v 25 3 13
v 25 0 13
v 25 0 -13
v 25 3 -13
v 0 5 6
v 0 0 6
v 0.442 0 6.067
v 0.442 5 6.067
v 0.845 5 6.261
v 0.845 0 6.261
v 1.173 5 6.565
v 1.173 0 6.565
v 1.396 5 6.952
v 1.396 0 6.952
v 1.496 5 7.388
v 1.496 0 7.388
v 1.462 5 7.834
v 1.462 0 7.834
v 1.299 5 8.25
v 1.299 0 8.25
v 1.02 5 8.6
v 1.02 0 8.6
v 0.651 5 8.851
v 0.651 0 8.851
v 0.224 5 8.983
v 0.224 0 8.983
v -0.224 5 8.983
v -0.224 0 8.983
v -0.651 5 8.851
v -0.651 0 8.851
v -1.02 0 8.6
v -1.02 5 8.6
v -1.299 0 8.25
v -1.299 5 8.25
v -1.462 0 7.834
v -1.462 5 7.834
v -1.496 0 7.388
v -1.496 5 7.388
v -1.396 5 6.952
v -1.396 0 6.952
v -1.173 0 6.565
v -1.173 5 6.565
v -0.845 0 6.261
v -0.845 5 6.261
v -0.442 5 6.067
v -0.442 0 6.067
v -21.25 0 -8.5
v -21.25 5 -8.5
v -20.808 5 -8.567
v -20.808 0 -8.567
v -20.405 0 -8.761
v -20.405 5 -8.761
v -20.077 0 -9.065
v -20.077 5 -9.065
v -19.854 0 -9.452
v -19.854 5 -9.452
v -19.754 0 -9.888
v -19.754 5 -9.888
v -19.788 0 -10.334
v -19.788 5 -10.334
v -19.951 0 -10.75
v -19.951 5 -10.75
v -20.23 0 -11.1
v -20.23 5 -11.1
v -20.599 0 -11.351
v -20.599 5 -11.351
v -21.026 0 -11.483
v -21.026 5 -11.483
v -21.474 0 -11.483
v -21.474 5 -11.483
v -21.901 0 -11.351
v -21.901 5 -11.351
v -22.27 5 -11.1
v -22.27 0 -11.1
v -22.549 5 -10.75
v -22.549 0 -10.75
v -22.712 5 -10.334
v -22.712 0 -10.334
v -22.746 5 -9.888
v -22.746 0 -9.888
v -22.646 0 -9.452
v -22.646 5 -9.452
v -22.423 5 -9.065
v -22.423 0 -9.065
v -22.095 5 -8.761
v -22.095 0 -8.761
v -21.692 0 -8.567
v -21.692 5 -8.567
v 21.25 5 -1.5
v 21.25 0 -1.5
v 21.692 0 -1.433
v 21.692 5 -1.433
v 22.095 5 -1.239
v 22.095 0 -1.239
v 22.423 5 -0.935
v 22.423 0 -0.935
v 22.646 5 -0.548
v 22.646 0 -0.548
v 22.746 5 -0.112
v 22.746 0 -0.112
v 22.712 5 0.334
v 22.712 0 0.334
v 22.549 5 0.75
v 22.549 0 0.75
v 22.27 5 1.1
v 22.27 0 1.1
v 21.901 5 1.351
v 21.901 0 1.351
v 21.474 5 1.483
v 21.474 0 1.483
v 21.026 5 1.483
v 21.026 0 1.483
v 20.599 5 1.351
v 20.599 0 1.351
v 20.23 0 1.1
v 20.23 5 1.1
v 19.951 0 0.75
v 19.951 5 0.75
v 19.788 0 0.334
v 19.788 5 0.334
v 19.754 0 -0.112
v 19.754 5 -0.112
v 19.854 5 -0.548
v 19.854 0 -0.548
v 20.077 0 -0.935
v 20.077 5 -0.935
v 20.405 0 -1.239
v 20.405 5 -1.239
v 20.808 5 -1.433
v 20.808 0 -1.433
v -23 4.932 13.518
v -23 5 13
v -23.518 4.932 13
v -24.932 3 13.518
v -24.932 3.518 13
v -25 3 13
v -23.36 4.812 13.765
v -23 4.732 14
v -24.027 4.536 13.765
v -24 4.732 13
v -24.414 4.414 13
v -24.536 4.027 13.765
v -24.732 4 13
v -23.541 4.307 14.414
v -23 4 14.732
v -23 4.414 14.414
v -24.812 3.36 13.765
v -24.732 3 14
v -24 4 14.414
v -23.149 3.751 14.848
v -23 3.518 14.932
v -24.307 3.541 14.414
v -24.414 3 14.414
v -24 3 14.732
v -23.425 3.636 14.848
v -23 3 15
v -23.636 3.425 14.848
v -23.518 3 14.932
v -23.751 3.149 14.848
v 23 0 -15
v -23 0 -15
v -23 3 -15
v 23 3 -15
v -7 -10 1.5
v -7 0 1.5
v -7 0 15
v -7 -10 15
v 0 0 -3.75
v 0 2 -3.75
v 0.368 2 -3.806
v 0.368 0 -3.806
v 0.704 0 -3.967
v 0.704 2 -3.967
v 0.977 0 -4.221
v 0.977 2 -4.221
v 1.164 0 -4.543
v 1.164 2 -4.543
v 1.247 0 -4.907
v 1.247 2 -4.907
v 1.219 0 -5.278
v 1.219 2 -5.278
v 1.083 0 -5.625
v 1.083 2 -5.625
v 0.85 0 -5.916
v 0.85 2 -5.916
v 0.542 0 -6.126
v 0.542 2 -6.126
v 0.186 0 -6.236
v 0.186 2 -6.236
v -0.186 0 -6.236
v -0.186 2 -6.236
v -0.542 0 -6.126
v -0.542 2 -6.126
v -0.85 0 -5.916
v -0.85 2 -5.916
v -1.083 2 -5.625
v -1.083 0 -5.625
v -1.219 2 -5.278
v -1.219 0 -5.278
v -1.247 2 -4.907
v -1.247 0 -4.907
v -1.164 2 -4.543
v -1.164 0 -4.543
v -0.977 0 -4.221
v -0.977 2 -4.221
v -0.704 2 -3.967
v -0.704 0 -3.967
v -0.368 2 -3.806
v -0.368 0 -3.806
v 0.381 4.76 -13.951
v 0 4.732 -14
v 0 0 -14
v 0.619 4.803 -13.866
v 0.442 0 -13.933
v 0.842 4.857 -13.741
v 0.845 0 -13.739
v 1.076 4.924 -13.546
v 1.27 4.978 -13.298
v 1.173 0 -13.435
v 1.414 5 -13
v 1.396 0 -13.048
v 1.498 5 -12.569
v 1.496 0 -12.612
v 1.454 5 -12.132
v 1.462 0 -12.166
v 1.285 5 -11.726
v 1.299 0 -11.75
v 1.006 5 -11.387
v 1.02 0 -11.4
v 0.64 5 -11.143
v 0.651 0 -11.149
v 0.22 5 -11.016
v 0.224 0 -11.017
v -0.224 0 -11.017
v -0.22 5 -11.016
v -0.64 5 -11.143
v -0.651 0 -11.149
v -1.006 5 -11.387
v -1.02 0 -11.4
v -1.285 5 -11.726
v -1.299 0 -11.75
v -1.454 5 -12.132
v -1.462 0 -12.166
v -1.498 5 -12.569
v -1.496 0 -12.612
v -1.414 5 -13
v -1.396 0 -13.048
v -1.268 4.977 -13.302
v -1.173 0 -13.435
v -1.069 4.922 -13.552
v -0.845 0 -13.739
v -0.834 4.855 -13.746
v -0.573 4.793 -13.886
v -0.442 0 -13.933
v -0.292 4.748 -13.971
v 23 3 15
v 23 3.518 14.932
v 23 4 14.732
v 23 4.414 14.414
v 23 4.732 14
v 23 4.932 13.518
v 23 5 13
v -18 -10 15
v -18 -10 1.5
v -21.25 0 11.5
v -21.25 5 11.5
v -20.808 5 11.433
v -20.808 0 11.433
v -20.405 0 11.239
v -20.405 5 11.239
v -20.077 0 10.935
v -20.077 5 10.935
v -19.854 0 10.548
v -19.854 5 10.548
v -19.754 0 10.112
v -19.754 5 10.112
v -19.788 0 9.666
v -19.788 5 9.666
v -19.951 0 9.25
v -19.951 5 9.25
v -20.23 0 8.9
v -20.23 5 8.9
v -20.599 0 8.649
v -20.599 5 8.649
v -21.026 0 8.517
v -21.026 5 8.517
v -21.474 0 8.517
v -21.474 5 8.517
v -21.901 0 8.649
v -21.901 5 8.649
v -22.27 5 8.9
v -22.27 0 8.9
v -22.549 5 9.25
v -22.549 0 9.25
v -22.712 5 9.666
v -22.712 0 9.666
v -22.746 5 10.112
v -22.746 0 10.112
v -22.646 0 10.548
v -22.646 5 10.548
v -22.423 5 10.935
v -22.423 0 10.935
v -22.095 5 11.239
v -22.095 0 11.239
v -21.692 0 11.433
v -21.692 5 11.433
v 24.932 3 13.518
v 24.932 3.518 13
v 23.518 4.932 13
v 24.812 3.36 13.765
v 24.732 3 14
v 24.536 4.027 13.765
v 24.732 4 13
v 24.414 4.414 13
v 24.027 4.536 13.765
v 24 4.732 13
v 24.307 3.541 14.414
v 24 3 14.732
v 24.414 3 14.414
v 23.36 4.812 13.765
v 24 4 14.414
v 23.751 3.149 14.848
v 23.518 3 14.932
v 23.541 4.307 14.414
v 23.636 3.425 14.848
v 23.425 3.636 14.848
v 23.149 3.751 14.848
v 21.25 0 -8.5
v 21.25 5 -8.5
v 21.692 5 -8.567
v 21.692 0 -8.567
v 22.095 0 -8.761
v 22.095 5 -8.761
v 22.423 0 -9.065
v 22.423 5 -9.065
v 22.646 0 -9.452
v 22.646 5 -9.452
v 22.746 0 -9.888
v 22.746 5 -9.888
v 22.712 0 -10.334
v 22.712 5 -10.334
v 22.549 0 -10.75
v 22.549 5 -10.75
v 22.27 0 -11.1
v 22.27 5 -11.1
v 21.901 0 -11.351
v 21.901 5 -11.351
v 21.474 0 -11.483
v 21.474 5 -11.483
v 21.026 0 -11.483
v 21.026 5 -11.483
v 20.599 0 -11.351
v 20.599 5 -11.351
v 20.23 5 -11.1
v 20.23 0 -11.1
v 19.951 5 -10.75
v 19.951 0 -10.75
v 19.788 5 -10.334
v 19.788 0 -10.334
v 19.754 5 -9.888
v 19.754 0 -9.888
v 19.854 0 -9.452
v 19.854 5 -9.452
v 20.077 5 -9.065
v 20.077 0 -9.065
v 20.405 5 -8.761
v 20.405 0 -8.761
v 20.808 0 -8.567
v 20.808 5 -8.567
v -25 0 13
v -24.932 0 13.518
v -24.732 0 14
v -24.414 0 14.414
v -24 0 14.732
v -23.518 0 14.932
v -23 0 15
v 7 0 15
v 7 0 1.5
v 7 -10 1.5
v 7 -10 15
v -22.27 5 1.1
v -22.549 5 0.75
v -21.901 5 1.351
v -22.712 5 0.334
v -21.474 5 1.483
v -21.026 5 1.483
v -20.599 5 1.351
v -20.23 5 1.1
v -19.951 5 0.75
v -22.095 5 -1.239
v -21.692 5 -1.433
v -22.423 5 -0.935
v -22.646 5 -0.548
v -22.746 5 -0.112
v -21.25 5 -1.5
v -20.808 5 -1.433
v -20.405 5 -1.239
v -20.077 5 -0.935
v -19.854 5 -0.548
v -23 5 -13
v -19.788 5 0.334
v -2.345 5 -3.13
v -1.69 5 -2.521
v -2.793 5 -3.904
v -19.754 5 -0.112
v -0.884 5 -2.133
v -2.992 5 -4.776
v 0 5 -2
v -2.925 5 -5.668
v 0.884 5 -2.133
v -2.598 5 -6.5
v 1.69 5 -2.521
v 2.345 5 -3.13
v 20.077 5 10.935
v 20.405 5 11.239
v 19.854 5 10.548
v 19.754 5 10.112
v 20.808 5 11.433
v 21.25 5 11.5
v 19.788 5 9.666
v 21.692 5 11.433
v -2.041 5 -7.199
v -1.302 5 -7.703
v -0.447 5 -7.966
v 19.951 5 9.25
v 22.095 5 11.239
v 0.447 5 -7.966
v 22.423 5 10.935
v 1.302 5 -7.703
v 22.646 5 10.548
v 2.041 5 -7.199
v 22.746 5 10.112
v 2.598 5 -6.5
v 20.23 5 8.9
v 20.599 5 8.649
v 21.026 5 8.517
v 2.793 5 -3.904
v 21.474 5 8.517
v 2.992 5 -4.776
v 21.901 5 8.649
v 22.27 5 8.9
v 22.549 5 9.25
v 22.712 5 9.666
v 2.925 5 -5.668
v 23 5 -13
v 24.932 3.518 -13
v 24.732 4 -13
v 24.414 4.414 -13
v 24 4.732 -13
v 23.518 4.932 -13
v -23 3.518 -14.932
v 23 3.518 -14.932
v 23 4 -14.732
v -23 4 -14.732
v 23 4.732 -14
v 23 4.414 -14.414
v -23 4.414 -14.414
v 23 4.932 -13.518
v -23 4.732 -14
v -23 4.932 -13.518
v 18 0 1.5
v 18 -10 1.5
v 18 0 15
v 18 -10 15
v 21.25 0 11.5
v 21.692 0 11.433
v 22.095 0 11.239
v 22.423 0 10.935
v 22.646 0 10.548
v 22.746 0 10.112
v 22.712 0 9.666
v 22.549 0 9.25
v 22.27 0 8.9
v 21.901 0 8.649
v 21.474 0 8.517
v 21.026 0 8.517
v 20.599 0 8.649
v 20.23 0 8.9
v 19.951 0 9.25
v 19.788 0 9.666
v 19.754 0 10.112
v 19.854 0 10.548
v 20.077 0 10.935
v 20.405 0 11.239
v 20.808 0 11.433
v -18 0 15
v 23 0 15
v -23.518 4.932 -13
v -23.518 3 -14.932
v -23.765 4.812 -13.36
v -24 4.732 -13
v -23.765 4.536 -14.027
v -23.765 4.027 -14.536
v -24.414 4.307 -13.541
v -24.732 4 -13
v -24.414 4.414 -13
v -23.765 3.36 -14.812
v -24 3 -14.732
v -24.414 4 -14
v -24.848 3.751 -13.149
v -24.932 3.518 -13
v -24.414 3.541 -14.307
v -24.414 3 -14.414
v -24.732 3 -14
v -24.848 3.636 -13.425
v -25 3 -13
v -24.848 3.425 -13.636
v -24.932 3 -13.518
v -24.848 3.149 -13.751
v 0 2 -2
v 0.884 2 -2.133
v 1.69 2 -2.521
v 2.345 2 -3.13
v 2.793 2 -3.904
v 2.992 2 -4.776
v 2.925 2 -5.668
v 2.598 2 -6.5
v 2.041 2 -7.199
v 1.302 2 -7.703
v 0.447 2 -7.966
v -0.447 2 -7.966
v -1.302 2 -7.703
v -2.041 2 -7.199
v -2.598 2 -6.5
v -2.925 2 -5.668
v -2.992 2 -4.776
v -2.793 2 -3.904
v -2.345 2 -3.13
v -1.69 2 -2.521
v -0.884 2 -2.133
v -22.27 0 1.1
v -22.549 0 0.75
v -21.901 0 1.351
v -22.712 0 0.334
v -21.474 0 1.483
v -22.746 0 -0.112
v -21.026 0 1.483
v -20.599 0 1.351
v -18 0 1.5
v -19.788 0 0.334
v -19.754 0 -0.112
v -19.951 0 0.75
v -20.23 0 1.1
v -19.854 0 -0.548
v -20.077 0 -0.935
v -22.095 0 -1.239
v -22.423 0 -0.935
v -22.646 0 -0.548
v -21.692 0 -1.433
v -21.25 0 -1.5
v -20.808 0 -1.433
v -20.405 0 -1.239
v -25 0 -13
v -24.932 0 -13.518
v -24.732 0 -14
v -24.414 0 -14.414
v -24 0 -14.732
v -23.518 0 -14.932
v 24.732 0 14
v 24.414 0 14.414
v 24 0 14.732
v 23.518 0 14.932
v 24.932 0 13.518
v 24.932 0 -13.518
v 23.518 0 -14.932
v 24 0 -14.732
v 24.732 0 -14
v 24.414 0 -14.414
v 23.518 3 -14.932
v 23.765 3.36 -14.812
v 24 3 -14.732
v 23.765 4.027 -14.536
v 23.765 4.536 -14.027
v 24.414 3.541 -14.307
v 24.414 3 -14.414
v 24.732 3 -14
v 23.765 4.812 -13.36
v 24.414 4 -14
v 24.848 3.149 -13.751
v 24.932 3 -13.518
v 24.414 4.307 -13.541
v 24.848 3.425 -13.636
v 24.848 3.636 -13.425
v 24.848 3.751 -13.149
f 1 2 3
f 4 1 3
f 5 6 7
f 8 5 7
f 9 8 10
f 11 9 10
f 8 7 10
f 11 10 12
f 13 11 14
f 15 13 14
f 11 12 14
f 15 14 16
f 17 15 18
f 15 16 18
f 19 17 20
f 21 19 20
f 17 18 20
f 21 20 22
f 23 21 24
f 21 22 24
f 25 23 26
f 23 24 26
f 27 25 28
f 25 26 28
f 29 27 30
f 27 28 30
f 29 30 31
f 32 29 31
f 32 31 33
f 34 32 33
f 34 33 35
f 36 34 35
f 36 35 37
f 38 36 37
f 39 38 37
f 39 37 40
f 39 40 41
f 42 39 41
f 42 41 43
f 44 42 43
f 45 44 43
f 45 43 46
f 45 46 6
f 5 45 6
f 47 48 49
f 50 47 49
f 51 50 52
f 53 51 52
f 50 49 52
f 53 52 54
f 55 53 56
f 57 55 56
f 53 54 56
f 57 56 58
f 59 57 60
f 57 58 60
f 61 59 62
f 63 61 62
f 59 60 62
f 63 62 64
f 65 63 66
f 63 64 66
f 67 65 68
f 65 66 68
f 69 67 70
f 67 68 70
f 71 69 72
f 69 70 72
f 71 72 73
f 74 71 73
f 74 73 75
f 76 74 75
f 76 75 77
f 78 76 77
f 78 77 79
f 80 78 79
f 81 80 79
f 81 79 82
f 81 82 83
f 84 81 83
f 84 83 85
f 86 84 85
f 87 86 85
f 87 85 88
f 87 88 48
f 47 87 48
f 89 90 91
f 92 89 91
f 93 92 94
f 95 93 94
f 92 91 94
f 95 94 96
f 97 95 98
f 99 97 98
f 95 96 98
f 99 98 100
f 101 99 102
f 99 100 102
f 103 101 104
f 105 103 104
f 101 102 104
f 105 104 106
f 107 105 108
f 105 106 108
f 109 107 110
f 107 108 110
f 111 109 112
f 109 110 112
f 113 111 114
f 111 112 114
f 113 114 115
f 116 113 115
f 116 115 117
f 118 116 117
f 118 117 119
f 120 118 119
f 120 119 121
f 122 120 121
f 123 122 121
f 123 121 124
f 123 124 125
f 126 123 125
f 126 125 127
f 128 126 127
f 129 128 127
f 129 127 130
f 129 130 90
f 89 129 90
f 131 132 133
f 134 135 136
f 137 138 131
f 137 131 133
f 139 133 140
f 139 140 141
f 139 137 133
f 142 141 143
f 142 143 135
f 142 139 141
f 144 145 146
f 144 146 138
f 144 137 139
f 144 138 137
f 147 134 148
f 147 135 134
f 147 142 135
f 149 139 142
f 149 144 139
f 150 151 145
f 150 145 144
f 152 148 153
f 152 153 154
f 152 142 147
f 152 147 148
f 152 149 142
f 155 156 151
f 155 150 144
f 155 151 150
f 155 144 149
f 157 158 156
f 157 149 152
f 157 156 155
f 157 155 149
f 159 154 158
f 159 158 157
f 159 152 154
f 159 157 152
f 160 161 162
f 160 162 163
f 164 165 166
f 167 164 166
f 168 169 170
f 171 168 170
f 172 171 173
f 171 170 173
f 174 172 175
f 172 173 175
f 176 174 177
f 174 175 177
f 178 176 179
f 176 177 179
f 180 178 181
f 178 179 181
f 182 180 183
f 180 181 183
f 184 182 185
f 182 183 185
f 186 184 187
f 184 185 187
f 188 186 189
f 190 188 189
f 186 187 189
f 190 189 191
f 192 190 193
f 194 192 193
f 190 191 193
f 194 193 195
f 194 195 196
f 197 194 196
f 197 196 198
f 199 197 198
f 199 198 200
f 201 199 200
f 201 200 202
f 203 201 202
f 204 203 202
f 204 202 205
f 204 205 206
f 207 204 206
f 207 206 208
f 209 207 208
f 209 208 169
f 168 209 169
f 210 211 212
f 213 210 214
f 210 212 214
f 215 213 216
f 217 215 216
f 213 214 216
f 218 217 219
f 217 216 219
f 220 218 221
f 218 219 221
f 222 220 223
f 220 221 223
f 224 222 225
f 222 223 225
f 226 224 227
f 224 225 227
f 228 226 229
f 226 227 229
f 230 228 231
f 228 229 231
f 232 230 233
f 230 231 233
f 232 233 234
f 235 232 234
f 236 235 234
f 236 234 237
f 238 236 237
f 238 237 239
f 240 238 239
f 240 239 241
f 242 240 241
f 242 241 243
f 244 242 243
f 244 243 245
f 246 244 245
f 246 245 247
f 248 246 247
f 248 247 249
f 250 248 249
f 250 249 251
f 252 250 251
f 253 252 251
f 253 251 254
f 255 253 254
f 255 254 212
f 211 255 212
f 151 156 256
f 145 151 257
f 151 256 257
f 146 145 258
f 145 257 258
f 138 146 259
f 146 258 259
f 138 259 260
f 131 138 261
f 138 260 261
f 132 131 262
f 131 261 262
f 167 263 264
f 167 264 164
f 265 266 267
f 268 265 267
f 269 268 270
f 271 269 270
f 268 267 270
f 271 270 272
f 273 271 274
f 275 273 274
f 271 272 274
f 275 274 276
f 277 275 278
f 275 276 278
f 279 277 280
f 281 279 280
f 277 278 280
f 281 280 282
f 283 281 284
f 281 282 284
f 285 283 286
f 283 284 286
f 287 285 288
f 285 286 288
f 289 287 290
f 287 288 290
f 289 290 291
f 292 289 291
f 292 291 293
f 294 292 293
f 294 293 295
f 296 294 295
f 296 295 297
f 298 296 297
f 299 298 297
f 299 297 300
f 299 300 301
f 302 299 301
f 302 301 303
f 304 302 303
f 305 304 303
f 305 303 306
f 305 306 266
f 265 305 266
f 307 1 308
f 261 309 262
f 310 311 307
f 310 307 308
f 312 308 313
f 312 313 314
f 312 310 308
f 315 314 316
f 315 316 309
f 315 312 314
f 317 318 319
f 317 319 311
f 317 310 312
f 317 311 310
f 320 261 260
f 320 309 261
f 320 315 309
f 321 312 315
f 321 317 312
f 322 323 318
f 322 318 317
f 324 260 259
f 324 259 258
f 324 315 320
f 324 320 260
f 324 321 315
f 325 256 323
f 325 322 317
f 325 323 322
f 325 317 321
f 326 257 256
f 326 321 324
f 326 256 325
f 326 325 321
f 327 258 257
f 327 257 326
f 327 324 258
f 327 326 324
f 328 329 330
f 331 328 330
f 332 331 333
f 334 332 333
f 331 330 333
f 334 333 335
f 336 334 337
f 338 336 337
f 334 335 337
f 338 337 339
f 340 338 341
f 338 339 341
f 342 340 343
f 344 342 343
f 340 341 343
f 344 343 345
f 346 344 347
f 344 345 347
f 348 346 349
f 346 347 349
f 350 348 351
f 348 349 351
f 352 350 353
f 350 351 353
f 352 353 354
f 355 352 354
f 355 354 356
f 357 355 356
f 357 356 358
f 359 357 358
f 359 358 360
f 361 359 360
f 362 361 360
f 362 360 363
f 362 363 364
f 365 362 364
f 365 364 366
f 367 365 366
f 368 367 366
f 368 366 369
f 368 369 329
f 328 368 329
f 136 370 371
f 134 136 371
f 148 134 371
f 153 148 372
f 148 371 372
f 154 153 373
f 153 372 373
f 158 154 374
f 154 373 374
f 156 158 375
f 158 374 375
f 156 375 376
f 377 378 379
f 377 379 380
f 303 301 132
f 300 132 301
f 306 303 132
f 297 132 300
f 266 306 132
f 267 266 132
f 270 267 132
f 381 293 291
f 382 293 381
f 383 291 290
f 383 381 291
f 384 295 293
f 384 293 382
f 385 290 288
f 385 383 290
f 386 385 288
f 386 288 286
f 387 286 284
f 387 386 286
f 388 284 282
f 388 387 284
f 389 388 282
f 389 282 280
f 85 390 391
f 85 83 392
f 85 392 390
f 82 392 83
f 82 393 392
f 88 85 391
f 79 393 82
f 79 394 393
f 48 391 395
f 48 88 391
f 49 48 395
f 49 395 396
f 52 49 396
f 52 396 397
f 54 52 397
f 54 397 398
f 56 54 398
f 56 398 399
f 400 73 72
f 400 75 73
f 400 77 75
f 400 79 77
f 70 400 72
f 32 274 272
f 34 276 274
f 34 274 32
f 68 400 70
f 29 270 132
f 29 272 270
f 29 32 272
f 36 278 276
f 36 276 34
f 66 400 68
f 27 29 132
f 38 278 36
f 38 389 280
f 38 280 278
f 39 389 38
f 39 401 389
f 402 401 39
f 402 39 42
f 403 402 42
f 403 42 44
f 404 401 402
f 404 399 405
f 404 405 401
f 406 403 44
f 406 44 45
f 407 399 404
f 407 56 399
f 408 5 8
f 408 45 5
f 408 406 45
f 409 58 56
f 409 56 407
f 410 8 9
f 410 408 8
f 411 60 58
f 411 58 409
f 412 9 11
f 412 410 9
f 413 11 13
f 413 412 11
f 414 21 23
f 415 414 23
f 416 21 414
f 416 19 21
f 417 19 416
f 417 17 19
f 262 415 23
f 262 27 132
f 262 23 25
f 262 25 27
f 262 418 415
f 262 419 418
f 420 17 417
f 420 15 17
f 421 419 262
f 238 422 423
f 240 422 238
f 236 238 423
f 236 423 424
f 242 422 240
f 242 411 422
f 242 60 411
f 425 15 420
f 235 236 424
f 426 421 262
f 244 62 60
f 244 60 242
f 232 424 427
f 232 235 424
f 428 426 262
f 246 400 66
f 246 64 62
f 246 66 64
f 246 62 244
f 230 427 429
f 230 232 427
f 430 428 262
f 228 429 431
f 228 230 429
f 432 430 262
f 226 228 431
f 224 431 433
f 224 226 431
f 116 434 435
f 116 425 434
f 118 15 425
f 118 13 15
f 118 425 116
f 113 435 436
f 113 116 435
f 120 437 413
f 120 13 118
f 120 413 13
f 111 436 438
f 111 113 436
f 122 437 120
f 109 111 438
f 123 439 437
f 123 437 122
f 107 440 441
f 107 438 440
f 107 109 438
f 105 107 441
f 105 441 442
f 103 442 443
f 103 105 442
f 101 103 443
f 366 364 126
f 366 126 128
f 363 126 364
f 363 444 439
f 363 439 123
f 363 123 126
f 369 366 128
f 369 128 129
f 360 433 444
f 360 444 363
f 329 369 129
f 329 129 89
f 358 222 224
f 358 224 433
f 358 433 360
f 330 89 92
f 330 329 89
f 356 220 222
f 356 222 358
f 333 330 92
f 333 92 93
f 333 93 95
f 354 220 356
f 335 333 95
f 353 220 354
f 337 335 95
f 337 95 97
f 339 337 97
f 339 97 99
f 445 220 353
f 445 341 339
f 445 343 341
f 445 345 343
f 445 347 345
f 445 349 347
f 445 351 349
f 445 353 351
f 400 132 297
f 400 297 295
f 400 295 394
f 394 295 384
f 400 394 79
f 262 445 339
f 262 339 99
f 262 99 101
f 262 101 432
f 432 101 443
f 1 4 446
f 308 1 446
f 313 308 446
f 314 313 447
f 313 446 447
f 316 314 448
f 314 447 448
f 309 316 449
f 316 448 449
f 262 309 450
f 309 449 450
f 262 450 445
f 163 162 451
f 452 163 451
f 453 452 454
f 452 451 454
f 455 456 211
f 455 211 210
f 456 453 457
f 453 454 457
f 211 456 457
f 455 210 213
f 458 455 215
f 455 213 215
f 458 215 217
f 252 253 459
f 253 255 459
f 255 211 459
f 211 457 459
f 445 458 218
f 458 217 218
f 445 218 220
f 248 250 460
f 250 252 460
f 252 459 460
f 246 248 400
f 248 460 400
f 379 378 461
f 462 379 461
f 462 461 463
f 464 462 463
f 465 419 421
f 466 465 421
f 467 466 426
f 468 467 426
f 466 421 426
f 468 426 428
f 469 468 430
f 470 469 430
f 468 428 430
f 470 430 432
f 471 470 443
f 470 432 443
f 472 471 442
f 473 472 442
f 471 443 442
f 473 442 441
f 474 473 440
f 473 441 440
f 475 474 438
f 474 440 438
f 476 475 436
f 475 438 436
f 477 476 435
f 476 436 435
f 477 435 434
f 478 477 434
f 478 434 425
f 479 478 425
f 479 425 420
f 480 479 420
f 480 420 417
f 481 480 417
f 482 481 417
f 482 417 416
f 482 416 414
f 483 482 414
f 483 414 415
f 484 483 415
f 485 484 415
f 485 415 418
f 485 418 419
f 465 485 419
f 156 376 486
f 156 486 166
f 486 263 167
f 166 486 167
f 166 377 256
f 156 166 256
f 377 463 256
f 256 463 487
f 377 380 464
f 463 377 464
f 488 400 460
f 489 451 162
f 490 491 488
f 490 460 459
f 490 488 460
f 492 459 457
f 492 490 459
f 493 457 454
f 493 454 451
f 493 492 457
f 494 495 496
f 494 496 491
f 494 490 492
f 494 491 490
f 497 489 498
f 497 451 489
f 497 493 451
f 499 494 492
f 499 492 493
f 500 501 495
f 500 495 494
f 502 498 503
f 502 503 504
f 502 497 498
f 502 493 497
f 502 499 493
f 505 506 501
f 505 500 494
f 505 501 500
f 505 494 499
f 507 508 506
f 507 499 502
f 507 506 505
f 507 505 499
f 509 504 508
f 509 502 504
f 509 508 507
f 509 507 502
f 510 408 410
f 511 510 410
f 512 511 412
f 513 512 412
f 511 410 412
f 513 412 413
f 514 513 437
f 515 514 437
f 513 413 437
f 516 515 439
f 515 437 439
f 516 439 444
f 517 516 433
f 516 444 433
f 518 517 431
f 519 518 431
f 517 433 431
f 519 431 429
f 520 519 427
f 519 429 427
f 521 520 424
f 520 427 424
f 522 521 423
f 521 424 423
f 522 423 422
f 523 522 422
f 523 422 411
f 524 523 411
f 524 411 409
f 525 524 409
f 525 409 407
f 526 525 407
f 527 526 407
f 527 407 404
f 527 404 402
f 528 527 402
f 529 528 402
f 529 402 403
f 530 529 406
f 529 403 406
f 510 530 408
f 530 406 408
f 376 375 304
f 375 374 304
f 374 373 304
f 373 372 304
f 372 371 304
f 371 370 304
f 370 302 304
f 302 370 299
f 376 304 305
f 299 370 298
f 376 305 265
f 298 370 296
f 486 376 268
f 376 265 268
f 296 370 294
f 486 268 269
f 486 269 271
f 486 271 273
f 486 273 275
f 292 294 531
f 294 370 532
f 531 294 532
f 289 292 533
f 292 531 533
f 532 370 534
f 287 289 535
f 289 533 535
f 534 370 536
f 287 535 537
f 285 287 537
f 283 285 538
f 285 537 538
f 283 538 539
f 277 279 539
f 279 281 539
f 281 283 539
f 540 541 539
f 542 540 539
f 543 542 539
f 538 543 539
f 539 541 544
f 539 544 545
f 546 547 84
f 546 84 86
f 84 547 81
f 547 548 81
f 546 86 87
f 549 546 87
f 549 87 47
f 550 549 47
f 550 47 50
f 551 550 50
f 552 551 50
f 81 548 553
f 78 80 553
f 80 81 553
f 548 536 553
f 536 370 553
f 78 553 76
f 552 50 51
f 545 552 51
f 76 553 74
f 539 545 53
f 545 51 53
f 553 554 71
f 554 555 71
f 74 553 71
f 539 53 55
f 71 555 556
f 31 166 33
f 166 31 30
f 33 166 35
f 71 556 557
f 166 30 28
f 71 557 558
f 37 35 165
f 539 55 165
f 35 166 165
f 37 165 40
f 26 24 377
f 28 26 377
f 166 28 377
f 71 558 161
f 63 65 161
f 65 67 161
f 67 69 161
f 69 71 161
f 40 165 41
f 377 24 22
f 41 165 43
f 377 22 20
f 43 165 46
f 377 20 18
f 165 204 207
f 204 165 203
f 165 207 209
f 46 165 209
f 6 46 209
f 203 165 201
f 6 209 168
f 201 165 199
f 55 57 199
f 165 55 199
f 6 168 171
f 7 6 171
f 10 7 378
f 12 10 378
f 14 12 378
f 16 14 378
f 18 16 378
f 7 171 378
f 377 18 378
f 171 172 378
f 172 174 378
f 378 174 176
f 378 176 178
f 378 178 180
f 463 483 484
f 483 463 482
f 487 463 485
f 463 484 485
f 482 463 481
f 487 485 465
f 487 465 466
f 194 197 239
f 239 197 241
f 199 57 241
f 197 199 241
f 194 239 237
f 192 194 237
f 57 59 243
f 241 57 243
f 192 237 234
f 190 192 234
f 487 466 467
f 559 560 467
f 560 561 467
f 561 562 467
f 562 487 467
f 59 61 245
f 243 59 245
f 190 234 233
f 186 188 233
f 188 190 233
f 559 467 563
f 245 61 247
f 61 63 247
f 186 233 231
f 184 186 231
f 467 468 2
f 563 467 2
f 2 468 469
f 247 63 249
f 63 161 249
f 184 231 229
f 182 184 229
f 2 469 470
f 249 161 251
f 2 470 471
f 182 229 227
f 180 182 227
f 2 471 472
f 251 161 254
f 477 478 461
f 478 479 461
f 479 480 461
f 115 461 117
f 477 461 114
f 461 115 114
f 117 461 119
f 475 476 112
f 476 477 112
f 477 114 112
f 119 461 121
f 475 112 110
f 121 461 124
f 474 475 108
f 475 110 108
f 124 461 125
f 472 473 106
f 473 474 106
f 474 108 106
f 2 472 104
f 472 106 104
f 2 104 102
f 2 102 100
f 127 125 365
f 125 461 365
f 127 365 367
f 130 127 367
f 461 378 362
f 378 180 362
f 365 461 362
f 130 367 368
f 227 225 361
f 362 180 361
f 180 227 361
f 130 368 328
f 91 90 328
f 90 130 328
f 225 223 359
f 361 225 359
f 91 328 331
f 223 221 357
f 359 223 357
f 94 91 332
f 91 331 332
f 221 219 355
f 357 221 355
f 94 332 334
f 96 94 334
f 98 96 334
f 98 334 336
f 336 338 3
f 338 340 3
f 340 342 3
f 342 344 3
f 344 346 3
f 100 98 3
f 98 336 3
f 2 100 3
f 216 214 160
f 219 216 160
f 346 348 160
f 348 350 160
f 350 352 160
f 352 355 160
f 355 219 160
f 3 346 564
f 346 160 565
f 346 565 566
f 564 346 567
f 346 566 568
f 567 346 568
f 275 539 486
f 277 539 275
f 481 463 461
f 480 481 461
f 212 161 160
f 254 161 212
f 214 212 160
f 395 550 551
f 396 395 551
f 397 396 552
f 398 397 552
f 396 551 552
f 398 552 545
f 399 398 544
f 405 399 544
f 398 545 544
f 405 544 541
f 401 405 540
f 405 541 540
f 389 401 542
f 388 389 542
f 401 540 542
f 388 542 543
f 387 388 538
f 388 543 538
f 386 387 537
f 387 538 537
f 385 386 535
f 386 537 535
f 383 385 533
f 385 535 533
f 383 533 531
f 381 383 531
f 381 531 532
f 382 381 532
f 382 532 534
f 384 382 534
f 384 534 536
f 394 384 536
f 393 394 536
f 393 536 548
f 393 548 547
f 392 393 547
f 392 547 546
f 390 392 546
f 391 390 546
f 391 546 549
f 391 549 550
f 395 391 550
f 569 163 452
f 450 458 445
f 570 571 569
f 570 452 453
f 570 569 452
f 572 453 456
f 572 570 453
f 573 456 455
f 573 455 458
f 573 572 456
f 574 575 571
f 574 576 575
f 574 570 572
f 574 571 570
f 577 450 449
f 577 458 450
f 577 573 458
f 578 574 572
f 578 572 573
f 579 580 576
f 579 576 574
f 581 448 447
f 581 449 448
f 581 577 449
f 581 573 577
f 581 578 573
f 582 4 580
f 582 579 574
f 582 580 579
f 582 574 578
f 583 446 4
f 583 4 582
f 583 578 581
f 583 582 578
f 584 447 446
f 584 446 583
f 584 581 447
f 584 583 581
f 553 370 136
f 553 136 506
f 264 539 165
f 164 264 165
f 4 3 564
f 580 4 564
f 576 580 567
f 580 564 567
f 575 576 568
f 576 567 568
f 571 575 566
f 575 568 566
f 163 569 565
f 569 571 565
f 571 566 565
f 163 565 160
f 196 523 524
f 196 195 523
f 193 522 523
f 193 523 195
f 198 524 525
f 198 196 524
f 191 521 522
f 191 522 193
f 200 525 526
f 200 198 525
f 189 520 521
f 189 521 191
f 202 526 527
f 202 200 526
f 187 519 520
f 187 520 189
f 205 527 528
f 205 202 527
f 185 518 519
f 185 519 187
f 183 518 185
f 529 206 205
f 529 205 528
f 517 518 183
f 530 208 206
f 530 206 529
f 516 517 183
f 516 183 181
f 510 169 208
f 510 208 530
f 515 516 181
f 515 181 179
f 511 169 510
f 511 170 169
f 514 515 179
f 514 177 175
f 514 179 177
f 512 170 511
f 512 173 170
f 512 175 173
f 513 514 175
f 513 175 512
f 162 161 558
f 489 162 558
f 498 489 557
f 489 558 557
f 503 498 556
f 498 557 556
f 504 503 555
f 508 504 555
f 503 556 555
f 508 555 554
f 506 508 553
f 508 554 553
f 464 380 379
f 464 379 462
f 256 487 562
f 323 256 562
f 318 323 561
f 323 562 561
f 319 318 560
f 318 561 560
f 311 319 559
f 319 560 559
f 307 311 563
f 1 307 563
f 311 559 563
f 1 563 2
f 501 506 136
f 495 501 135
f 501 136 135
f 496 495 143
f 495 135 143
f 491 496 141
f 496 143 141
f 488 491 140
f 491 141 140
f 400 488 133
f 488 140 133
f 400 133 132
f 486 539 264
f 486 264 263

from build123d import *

# Parameters (mm, degrees)
SKETCH_1_W          = 50
SKETCH_1_H          = 30
EXTRUDE_1_DEPTH     = 5
SKETCH_2_R          = 1.25
CUT_EXTRUDE_1_DEPTH = 30.580398915
SKETCH_3_R          = 1.5
CUT_EXTRUDE_2_DEPTH = 30.580398915
SKETCH_4_W          = 11
SKETCH_4_H          = 13.5
EXTRUDE_2_DEPTH     = 10
SKETCH_5_R          = 1.5
CUT_EXTRUDE_3_DEPTH = 33.787192622
FILLET_1_R          = 2
SKETCH_6_R          = 3
CUT_EXTRUDE_4_DEPTH = 3


with BuildPart() as part:
    # Эскиз1 → Бобышка-Вытянуть1 (new body)
    with BuildSketch(Plane(origin=(0, 0, 0), x_dir=(1, 0, 0), z_dir=(0, 1, 0))):
        Rectangle(SKETCH_1_W, SKETCH_1_H)
    extrude(amount=EXTRUDE_1_DEPTH)

    # Эскиз2 → Вырез-Вытянуть1 (cut, through all)
    with BuildSketch(Plane(origin=(0, 5, 0), x_dir=(1, 0, 0), z_dir=(0, 1, 0))):
        with Locations(Location((0, 5, 0), (0, 0, 270))):
            Circle(SKETCH_2_R)
    extrude(amount=-CUT_EXTRUDE_1_DEPTH, mode=Mode.SUBTRACT)

    # Эскиз3 → Вырез-Вытянуть2 (cut, through all)
    with BuildSketch(Plane.XZ):
        with Locations(Location((-21.25, 0, 0), (0, 0, 270))):
            Circle(SKETCH_3_R)
        with Locations(Location((0, 7.5, 0), (0, 0, 270))):
            Circle(SKETCH_3_R)
        with Locations(Location((21.25, 0, 0), (0, 0, 270))):
            Circle(SKETCH_3_R)
        with Locations(Location((0, -12.5, 0), (0, 0, 270))):
            Circle(SKETCH_3_R)
    extrude(amount=-CUT_EXTRUDE_2_DEPTH, mode=Mode.SUBTRACT)

    # Эскиз4 → Бобышка-Вытянуть2 (add)
    with BuildSketch(Plane.XZ):
        with Locations((-12.5, 8.25)):
            Rectangle(SKETCH_4_W, SKETCH_4_H)
        with Locations((12.5, 8.25)):
            Rectangle(SKETCH_4_W, SKETCH_4_H)
    extrude(amount=EXTRUDE_2_DEPTH)

    # Эскиз5 → Вырез-Вытянуть3 (cut, through all)
    with BuildSketch(Plane(origin=(0, 5, 0), x_dir=(1, 0, 0), z_dir=(0, 1, 0))):
        with Locations(Location((-21.25, -10, 0), (0, 0, 270))):
            Circle(SKETCH_5_R)
        with Locations(Location((-21.25, 10, 0), (0, 0, 270))):
            Circle(SKETCH_5_R)
        with Locations(Location((21.25, -10, 0), (0, 0, 270))):
            Circle(SKETCH_5_R)
        with Locations(Location((21.25, 10, 0), (0, 0, 270))):
            Circle(SKETCH_5_R)
    extrude(amount=-CUT_EXTRUDE_3_DEPTH, mode=Mode.SUBTRACT)

    # Скругление1
    # the kernel refuses this fillet: 2 mm, written as the material it takes off along each edge
    with BuildSketch(Plane(origin=(23, 3, -13), x_dir=(0, 1, 0), z_dir=(1, 0, 0))) as fillet_1_piece_1_section:
        Polygon((0, 0), (FILLET_1_R, 0), (FILLET_1_R, -FILLET_1_R), (0, -FILLET_1_R), align=None)
    fillet_1_piece_1 = extrude(amount=FILLET_1_R, mode=Mode.PRIVATE)
    fillet_1_piece_1 = fillet_1_piece_1 - Plane(origin=(23, 3, -13), x_dir=(0, -0.7071067811865475, 0.7071067811865475), z_dir=(1, 0, 0)) * Sphere(FILLET_1_R, mode=Mode.PRIVATE)
    add(fillet_1_piece_1, mode=Mode.SUBTRACT)
    with BuildSketch(Plane(origin=(23, 3, 13), x_dir=(1, 0, 0), z_dir=(0, 0, 1))) as fillet_1_piece_2_section:
        Polygon((0, 0), (FILLET_1_R, 0), (FILLET_1_R, FILLET_1_R), (0, FILLET_1_R), align=None)
    fillet_1_piece_2 = extrude(amount=FILLET_1_R, mode=Mode.PRIVATE)
    fillet_1_piece_2 = fillet_1_piece_2 - Plane(origin=(23, 3, 13), x_dir=(-0.7071067811865475, -0.7071067811865475, 0), z_dir=(0, 0, 1)) * Sphere(FILLET_1_R, mode=Mode.PRIVATE)
    add(fillet_1_piece_2, mode=Mode.SUBTRACT)
    with BuildSketch(Plane(origin=(-23, 3, -13), x_dir=(0, 1, 0), z_dir=(-1, 0, 0))) as fillet_1_piece_3_section:
        Polygon((0, 0), (FILLET_1_R, 0), (FILLET_1_R, FILLET_1_R), (0, FILLET_1_R), align=None)
    fillet_1_piece_3 = extrude(amount=FILLET_1_R, mode=Mode.PRIVATE)
    fillet_1_piece_3 = fillet_1_piece_3 - Plane(origin=(-23, 3, -13), x_dir=(0, -0.7071067811865475, 0.7071067811865475), z_dir=(-1, 0, 0)) * Sphere(FILLET_1_R, mode=Mode.PRIVATE)
    add(fillet_1_piece_3, mode=Mode.SUBTRACT)
    with BuildSketch(Plane(origin=(-23, 3, 13), x_dir=(0, 1, 0), z_dir=(0, 0, 1))) as fillet_1_piece_4_section:
        Polygon((0, 0), (FILLET_1_R, 0), (FILLET_1_R, FILLET_1_R), (0, FILLET_1_R), align=None)
    fillet_1_piece_4 = extrude(amount=FILLET_1_R, mode=Mode.PRIVATE)
    fillet_1_piece_4 = fillet_1_piece_4 - Plane(origin=(-23, 3, 13), x_dir=(0.7071067811865475, -0.7071067811865475, 0), z_dir=(0, 0, 1)) * Sphere(FILLET_1_R, mode=Mode.PRIVATE)
    add(fillet_1_piece_4, mode=Mode.SUBTRACT)
    with BuildSketch(Plane(origin=(25, 5, -13), x_dir=(0, -1, 0), z_dir=(0, 0, 1))) as fillet_1_piece_5:
        with BuildLine():
            CenterArc((FILLET_1_R, -FILLET_1_R), FILLET_1_R, 90, 90)
            Line((0, -FILLET_1_R), (0, 0))
            Line((0, 0), (FILLET_1_R, 0))
        make_face()
    extrude(amount=26, mode=Mode.SUBTRACT)
    with BuildSketch(Plane(origin=(-23, 5, -15), x_dir=(0, 0, 1), z_dir=(1, 0, 0))) as fillet_1_piece_6:
        with BuildLine():
            CenterArc((FILLET_1_R, FILLET_1_R), FILLET_1_R, 180, 90)
            Line((0, FILLET_1_R), (0, 0))
            Line((0, 0), (FILLET_1_R, 0))
        make_face()
    extrude(amount=46, mode=Mode.SUBTRACT)
    with BuildSketch(Plane(origin=(-25, 5, 13), x_dir=(1, 0, 0), z_dir=(0, 0, -1))) as fillet_1_piece_7:
        with BuildLine():
            CenterArc((FILLET_1_R, FILLET_1_R), FILLET_1_R, 180, 90)
            Line((0, FILLET_1_R), (0, 0))
            Line((0, 0), (FILLET_1_R, 0))
        make_face()
    extrude(amount=26, mode=Mode.SUBTRACT)
    with BuildSketch(Plane(origin=(-25, -5, -15), x_dir=(0, 0, 1), z_dir=(0, 1, 0)), Plane(origin=(-25, -5, 15), x_dir=(1, 0, 0), z_dir=(0, 1, 0))) as fillet_1_piece_8:
        with BuildLine():
            CenterArc((FILLET_1_R, FILLET_1_R), FILLET_1_R, 180, 90)
            Line((0, FILLET_1_R), (0, 0))
            Line((0, 0), (FILLET_1_R, 0))
        make_face()
    extrude(amount=8, mode=Mode.SUBTRACT)
    with BuildSketch(Plane(origin=(25, -5, -15), x_dir=(0, 0, 1), z_dir=(0, 1, 0)), Plane(origin=(25, -5, 15), x_dir=(-1, 0, 0), z_dir=(0, 1, 0))) as fillet_1_piece_9:
        with BuildLine():
            CenterArc((FILLET_1_R, -FILLET_1_R), FILLET_1_R, 90, 90)
            Line((0, -FILLET_1_R), (0, 0))
            Line((0, 0), (FILLET_1_R, 0))
        make_face()
    extrude(amount=8, mode=Mode.SUBTRACT)
    with BuildSketch(Plane(origin=(23, 5, 15), x_dir=(0, -1, 0), z_dir=(-1, 0, 0))) as fillet_1_piece_10:
        with BuildLine():
            CenterArc((FILLET_1_R, -FILLET_1_R), FILLET_1_R, 90, 90)
            Line((0, -FILLET_1_R), (0, 0))
            Line((0, 0), (FILLET_1_R, 0))
        make_face()
    extrude(amount=46, mode=Mode.SUBTRACT)

    # Эскиз6 → Вырез-Вытянуть4 (cut)
    with BuildSketch(Plane(origin=(0, 5, 0), x_dir=(1, 0, 0), z_dir=(0, 1, 0))):
        with Locations(Location((0, 5, 0), (0, 0, 270))):
            Circle(SKETCH_6_R)
    extrude(amount=-CUT_EXTRUDE_4_DEPTH, mode=Mode.SUBTRACT)


solid = part.part
